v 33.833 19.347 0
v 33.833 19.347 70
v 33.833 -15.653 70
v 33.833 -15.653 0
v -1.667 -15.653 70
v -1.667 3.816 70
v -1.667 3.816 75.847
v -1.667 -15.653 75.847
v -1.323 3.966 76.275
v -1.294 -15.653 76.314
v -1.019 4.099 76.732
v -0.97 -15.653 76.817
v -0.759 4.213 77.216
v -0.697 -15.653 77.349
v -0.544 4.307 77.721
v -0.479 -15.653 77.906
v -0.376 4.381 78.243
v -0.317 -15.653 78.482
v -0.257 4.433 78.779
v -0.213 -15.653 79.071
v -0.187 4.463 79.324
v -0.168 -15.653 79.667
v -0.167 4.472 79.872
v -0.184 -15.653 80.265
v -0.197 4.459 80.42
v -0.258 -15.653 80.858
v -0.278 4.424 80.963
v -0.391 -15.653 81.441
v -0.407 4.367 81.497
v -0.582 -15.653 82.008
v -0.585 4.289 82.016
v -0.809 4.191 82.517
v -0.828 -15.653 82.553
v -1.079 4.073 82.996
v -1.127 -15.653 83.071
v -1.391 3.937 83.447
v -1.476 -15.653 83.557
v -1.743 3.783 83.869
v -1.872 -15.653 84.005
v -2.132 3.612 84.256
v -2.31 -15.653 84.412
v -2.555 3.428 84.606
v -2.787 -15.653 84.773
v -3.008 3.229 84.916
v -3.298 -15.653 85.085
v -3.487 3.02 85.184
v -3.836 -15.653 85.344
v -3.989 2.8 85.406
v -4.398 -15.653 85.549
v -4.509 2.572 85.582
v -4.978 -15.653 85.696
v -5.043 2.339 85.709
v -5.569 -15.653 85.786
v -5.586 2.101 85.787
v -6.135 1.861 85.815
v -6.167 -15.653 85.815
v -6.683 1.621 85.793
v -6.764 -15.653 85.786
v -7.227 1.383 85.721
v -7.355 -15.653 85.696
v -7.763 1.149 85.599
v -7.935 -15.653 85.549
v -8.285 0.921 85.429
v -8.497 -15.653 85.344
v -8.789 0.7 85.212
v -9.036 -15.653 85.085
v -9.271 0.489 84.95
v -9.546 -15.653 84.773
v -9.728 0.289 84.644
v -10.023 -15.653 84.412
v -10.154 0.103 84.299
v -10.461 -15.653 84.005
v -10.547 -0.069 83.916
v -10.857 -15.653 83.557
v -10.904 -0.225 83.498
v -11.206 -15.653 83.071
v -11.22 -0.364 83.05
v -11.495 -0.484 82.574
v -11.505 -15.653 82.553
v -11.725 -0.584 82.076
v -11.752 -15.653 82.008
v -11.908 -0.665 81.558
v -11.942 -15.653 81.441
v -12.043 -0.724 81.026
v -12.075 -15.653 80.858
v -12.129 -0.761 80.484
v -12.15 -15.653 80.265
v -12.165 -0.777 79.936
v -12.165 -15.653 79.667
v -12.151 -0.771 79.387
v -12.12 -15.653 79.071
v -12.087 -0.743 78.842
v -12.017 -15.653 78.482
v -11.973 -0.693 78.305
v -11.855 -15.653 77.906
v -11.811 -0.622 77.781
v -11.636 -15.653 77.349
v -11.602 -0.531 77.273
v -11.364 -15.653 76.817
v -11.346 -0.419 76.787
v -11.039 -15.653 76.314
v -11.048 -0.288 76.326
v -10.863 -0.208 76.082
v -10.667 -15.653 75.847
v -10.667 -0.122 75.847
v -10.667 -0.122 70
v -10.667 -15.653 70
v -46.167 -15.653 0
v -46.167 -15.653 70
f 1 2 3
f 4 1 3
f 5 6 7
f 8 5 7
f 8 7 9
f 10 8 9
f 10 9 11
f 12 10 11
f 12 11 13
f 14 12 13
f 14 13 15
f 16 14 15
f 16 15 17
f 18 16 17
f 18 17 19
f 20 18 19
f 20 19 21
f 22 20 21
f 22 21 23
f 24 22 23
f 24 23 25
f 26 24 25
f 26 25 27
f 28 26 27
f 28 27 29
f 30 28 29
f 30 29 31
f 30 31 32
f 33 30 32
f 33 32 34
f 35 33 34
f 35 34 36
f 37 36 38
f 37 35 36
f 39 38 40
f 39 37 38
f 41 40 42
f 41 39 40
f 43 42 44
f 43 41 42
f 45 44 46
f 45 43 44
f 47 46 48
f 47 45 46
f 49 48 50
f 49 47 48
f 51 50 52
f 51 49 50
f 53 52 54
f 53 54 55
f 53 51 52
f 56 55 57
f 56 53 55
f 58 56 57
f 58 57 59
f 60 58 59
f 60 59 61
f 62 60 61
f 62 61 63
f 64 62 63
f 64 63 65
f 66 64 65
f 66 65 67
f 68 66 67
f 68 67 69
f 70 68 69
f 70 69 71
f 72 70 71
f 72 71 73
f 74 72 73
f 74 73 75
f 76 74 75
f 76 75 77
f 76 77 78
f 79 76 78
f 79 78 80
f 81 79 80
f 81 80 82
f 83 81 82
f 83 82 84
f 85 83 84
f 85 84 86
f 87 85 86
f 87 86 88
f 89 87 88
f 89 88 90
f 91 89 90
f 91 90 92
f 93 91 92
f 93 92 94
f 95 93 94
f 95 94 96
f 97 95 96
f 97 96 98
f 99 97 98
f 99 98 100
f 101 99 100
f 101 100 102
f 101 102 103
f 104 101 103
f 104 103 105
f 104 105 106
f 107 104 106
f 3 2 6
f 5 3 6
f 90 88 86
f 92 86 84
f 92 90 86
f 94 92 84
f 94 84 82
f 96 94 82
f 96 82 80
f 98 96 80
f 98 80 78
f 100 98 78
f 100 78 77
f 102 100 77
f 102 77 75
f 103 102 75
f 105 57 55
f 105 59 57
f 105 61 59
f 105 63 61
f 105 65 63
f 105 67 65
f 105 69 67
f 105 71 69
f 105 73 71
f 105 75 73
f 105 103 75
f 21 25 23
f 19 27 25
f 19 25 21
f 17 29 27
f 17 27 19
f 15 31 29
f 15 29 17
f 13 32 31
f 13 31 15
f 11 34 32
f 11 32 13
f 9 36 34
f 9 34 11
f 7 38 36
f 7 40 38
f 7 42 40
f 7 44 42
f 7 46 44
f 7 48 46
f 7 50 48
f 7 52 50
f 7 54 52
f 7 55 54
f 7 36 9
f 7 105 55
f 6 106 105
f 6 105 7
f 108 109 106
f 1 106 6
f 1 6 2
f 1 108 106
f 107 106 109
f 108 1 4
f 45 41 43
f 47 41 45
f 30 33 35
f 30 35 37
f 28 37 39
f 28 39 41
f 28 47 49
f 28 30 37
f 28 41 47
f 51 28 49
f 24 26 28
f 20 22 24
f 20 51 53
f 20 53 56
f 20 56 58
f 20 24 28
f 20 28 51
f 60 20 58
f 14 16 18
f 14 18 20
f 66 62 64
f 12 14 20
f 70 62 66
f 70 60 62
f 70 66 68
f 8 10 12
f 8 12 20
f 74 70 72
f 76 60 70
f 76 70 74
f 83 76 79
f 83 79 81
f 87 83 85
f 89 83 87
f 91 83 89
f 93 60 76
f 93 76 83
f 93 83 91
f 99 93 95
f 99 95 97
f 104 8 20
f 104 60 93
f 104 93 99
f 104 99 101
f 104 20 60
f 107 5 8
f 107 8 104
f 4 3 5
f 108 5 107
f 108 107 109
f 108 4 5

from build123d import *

# Parameters (mm, degrees)
RESSALTO_EXTRUS_O1_DEPTH = 70
RESSALTO_EXTRUS_O2_REACH = 92.865


with BuildPart() as part:
    # Esboço1 → Ressalto-extrusão1 (new body)
    with BuildSketch(Plane.XY):
        Polygon((-46.166666667, -15.652777778), (33.833333333, 19.347222222), (33.833333333, -15.652777778), align=None)
    extrude(amount=RESSALTO_EXTRUS_O1_DEPTH)

    # Ressalto-extrusão2: up to this plane
    ressalto_extrus_o2_end = Plane(origin=(-46.166666667, -15.652777778, 70), z_dir=(0.4008188340197078, -0.9161573349021892, 0))
    # Esboço3 → Ressalto-extrusão2 (add, up to the surface)
    with BuildSketch(Plane.XZ.offset(15.652777778), mode=Mode.PRIVATE) as ressalto_extrus_o2_sk1:
        with BuildLine():
            Line((-10.666666667, 70), (-1.666666667, 70))
            Line((-1.666666667, 70), (-1.666666667, 75.846688069))
            ThreePointArc((-1.666666667, 75.846688069), (-6.166666667, 85.815315035), (-10.666666667, 75.846688069))
            Line((-10.666666667, 75.846688069), (-10.666666667, 70))
        make_face()
    ressalto_extrus_o2_tool1 = split(extrude(ressalto_extrus_o2_sk1.sketch, amount=-RESSALTO_EXTRUS_O2_REACH, mode=Mode.PRIVATE), bisect_by=ressalto_extrus_o2_end, keep=Keep.BOTH, mode=Mode.PRIVATE)
    add(ressalto_extrus_o2_tool1.solids().sort_by_distance((-6.166667, -15.652778, 77.842662))[0])


solid = part.part
